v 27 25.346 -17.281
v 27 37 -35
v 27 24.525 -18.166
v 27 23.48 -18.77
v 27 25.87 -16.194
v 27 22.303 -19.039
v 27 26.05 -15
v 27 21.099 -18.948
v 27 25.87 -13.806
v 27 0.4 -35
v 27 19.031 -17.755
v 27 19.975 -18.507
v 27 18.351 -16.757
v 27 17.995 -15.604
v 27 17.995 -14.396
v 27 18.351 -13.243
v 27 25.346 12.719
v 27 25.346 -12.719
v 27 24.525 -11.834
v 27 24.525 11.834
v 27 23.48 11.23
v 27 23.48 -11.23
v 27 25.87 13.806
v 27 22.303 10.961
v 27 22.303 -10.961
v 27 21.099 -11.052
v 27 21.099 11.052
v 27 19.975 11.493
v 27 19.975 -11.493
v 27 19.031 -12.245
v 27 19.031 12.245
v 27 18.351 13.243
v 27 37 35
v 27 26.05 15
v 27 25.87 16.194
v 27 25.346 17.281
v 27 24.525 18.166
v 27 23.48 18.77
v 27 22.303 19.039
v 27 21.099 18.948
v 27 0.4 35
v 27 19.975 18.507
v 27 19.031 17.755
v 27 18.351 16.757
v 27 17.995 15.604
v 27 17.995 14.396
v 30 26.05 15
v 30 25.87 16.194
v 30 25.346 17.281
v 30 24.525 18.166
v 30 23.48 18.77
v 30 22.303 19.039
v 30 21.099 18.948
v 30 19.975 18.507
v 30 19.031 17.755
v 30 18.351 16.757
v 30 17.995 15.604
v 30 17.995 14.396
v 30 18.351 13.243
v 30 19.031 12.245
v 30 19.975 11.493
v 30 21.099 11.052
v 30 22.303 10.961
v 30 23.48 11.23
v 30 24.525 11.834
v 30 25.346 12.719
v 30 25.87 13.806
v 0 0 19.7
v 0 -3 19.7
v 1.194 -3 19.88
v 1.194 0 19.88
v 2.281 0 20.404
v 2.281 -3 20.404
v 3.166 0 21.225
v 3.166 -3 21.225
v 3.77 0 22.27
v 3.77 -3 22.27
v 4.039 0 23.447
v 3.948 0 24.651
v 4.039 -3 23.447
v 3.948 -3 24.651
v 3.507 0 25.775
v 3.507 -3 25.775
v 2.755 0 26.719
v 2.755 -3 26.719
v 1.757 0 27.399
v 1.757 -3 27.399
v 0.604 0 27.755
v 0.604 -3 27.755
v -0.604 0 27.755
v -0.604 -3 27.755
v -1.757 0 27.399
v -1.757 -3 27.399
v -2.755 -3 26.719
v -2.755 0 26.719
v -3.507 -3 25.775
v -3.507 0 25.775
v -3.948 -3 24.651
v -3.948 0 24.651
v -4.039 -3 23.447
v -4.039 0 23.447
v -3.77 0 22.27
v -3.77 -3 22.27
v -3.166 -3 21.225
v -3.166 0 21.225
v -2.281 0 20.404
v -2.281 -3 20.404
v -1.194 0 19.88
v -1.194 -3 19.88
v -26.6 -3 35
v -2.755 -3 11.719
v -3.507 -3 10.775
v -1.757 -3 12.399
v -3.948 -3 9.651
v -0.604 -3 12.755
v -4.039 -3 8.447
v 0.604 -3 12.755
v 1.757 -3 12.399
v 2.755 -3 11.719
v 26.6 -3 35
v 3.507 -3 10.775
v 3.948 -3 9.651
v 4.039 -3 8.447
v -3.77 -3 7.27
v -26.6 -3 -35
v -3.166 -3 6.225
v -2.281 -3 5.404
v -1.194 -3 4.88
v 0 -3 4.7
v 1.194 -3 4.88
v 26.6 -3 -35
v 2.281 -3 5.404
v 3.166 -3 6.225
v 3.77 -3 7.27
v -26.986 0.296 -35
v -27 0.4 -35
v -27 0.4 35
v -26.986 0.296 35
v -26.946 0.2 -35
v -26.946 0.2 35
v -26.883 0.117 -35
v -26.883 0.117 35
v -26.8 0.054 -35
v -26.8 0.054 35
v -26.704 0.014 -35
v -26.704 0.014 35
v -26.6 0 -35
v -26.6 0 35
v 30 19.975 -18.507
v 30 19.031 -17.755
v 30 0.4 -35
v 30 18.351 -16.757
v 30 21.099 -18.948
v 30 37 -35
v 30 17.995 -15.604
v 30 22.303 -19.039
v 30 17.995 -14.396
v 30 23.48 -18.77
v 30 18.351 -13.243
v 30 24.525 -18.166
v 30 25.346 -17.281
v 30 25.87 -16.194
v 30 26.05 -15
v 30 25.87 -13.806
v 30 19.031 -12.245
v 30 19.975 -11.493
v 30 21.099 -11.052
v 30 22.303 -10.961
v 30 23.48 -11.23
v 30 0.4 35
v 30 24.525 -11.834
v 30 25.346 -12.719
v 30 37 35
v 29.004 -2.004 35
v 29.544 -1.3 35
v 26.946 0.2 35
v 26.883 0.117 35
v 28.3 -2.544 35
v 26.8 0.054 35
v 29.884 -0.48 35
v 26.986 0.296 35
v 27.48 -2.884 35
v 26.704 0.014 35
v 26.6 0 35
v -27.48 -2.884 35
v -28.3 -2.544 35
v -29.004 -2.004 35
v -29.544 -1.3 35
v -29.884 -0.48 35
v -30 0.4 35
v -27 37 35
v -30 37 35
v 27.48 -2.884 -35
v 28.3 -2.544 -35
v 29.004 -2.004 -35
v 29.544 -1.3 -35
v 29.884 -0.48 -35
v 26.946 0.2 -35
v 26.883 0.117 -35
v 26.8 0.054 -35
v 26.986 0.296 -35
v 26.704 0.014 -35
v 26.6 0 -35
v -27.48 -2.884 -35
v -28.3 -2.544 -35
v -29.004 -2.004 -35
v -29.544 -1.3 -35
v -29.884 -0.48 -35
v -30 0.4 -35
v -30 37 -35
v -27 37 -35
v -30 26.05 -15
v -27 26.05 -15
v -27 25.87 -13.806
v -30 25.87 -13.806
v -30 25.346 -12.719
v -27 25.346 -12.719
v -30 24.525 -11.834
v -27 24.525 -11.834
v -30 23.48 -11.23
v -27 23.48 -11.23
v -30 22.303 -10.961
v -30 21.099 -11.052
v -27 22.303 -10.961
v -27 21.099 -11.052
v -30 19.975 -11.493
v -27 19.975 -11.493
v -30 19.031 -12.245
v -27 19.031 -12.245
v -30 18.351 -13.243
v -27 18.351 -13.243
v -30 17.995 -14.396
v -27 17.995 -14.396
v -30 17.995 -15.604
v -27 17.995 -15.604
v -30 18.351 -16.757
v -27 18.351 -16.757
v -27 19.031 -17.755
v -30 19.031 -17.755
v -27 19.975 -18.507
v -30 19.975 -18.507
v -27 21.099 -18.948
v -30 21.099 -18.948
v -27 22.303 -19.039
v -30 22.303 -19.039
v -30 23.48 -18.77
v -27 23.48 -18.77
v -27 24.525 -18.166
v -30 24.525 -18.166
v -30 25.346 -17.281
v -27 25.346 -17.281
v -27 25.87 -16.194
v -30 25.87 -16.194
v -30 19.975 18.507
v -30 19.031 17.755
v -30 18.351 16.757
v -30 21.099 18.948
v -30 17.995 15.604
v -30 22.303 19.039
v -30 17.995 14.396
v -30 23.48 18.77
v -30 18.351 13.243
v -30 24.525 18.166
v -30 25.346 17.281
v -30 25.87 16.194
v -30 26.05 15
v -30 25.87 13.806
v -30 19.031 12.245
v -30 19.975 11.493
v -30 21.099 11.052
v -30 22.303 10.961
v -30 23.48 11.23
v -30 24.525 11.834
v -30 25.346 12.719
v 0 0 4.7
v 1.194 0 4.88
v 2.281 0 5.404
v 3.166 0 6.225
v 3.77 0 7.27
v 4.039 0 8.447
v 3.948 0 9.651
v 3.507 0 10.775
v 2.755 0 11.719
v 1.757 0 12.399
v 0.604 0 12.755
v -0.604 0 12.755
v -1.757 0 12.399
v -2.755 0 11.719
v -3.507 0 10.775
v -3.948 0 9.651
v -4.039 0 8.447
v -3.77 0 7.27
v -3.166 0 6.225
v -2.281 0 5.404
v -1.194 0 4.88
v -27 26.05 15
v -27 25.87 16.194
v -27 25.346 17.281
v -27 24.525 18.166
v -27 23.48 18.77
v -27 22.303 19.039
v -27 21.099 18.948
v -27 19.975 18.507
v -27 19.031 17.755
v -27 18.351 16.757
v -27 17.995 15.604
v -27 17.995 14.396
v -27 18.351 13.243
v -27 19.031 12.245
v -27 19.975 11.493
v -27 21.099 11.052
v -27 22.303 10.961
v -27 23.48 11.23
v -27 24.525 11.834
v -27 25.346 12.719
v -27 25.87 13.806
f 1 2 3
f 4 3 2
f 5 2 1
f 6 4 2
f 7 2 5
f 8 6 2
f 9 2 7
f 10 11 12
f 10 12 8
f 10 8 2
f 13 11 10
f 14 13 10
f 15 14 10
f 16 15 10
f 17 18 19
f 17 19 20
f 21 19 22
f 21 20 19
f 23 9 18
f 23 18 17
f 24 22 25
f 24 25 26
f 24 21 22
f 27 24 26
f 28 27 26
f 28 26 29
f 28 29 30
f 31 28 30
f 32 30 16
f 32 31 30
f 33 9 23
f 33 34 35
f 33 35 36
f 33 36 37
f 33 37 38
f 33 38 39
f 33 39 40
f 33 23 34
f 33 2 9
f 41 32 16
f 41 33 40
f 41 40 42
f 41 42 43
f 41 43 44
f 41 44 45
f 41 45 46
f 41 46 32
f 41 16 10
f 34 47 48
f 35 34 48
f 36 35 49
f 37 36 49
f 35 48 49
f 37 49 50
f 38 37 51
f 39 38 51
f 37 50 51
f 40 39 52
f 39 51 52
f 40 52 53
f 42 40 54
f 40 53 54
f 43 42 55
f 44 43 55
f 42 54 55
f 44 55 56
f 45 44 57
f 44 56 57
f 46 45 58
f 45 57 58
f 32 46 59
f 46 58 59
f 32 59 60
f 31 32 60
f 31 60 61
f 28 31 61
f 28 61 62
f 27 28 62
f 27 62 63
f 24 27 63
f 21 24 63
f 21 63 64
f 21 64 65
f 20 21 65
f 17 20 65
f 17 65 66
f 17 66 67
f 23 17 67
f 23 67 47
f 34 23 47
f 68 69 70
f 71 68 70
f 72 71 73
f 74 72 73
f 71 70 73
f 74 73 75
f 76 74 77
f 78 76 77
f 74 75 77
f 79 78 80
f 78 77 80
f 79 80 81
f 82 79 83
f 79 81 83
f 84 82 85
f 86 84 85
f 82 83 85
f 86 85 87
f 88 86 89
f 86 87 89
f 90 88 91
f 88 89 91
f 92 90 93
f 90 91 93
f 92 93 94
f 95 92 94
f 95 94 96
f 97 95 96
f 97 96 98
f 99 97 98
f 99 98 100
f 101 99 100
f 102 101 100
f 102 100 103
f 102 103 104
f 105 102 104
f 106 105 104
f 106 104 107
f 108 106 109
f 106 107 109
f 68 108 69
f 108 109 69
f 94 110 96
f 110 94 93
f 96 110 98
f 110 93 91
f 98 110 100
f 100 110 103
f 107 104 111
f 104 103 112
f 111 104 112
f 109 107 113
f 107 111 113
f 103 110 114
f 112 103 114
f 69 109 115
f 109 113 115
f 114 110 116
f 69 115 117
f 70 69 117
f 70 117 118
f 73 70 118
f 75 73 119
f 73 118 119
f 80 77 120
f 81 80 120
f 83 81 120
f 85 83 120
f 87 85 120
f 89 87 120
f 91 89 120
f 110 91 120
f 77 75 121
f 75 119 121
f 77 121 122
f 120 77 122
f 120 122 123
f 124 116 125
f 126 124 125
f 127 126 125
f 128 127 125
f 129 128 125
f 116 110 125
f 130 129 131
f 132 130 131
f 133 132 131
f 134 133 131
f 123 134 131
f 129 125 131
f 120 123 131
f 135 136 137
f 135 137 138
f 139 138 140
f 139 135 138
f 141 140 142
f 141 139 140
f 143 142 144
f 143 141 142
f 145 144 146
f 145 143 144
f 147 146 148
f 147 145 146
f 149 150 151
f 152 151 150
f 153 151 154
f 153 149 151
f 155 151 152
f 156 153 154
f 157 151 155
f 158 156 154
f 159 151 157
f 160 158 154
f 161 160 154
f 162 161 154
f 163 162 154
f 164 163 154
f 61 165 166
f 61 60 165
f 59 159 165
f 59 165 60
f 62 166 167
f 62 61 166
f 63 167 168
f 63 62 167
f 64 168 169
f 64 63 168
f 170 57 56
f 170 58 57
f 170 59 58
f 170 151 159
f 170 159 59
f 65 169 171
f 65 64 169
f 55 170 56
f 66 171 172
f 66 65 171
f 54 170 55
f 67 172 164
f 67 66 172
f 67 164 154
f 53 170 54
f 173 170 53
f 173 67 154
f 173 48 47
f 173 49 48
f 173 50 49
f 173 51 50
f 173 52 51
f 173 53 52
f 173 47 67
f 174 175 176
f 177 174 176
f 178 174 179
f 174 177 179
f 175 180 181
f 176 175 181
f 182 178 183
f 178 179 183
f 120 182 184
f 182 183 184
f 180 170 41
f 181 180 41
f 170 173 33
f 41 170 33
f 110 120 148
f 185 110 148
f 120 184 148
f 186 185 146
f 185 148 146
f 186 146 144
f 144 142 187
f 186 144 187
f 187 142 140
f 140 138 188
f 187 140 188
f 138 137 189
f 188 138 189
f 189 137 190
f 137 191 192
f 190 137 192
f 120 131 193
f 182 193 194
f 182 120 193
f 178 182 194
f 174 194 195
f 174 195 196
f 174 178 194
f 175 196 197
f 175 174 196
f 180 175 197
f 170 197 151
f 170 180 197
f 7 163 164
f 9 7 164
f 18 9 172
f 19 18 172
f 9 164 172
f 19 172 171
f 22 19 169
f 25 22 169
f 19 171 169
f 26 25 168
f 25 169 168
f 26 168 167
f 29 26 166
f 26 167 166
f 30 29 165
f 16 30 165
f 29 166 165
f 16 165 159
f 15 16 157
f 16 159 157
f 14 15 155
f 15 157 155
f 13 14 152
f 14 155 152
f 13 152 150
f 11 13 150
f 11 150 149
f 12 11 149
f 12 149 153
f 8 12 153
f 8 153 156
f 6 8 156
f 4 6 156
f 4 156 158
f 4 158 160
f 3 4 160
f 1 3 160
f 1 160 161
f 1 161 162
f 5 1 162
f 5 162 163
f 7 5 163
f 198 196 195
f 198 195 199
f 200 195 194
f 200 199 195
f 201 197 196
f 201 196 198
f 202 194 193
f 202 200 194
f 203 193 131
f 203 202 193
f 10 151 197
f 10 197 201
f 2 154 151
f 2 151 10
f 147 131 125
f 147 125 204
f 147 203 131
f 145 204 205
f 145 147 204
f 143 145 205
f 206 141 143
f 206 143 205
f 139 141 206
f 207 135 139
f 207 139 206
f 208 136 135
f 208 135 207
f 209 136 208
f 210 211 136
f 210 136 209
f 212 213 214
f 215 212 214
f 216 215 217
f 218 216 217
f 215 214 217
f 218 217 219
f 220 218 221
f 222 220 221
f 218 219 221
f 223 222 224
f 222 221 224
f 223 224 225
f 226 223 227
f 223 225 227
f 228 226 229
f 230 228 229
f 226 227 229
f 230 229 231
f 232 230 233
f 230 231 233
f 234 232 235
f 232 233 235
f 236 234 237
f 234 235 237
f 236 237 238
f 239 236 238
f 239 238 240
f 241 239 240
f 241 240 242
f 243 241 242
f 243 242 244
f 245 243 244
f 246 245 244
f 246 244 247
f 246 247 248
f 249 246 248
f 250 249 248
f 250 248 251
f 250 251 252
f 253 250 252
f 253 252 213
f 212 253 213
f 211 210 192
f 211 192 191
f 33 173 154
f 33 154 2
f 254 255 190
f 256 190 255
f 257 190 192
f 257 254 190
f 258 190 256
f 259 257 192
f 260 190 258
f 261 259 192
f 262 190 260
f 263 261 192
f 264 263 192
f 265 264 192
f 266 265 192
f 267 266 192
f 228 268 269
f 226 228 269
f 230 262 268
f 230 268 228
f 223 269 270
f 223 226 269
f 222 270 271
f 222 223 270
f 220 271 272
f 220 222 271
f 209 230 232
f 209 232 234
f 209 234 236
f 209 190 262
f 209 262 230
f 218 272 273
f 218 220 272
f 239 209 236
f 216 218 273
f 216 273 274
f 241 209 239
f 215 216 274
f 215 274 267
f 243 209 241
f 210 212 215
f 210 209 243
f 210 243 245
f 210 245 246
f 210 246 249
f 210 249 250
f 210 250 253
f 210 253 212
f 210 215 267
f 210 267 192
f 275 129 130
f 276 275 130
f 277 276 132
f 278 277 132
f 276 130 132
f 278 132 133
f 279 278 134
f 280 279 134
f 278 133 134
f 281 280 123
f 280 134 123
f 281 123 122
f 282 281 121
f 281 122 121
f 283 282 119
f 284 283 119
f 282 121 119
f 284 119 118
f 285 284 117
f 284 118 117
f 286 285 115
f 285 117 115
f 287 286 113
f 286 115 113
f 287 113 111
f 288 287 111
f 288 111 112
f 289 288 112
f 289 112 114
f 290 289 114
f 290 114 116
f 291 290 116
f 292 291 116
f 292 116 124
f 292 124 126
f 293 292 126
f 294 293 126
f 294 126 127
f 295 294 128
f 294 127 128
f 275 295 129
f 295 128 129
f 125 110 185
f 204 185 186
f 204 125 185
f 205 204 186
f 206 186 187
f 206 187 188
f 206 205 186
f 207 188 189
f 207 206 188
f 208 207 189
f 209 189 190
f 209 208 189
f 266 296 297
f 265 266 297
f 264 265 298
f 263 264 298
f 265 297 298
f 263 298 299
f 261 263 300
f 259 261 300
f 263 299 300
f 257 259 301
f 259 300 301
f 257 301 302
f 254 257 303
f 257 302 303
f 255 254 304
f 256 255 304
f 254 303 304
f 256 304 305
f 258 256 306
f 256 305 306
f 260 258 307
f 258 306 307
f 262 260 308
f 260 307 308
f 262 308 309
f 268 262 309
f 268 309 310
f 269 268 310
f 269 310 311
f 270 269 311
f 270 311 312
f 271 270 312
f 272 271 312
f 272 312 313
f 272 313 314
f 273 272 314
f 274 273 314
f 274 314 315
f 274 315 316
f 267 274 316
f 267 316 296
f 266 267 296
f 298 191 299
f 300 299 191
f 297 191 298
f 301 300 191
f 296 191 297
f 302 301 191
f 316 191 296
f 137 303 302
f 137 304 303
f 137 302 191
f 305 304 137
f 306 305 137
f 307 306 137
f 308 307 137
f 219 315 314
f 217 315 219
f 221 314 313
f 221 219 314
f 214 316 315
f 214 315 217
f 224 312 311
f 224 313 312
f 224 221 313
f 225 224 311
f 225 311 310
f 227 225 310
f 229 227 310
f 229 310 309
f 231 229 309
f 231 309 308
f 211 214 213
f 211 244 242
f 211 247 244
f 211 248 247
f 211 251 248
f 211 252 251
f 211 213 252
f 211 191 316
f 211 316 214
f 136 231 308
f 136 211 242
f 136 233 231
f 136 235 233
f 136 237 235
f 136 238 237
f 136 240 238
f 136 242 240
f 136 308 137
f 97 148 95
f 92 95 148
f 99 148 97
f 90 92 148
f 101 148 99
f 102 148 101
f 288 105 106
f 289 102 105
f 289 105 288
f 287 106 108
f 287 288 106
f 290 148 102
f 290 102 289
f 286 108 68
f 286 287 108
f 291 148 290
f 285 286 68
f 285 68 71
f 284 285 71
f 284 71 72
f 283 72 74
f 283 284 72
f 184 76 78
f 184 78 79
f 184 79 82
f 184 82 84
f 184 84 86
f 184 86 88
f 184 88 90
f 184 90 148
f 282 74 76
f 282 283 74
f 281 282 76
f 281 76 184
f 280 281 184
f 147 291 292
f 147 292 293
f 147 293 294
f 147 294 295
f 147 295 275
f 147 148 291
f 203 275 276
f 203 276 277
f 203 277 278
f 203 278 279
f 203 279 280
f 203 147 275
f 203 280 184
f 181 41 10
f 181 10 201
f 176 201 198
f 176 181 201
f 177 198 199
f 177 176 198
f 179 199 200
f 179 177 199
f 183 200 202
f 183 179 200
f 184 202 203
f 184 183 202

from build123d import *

# Parameters (mm, degrees)
SKETCH1_W                      = 60
SKETCH1_H                      = 70
BASE_FLANGE1_DEPTH             = 3
EDGE_FLANGE1_STRIP_W           = 12.8
EDGE_FLANGE1_STRIP_H           = 3
EDGE_FLANGE1_STRIP_CUT_DEPTH   = 70
EDGE_FLANGE1_STRIP_2_W         = 12.8
EDGE_FLANGE1_STRIP_2_H         = 3
EDGE_FLANGE1_STRIP_CUT_2_DEPTH = 70
EDGE_FLANGE1_DEPTH             = 70
EDGE_FLANGE1_BEND_DEPTH        = 70
CUT_EXTRUDE1_REACH             = 80.702
SKETCH14_R                     = 4.05
SKETCH15_R                     = 4.05
CUT_EXTRUDE2_DEPTH             = 3


# Sheet-metal steps are written as plain solids
with BuildPart() as part:
    # Sketch1 → Base-Flange1 (new body)
    with BuildSketch(Plane(origin=(0, 0, 0), x_dir=(1, 0, 0), z_dir=(0, 1, 0))):
        Rectangle(SKETCH1_W, SKETCH1_H)
    extrude(amount=-BASE_FLANGE1_DEPTH)

    # Edge-Flange1 strip (across the edge) → Edge-Flange1 strip cut (cut)
    with BuildSketch(Plane(origin=(30, 0, 35), x_dir=(-1, 0, 0), z_dir=(0, 0, -1))):
        with Locations((-3, -1.5)):
            Rectangle(EDGE_FLANGE1_STRIP_W, EDGE_FLANGE1_STRIP_H)
    extrude(amount=EDGE_FLANGE1_STRIP_CUT_DEPTH, mode=Mode.SUBTRACT)

    # Edge-Flange1 strip 2 (across the edge) → Edge-Flange1 strip cut 2 (cut)
    with BuildSketch(Plane(origin=(-30, 0, -35), x_dir=(1, 0, 0), z_dir=(0, 0, 1))):
        with Locations((-3, -1.5)):
            Rectangle(EDGE_FLANGE1_STRIP_2_W, EDGE_FLANGE1_STRIP_2_H)
    extrude(amount=EDGE_FLANGE1_STRIP_CUT_2_DEPTH, mode=Mode.SUBTRACT)

    # Edge-Flange1 section (across the edge) → Edge-Flange1 (add)
    with BuildSketch(Plane(origin=(30, 0, 35), x_dir=(-1, 0, 0), z_dir=(0, 0, -1))):
        with BuildLine():
            Line((0, 0.4), (0, 37))
            Line((0, 37), (3, 37))
            Line((3, 37), (3, 0.4))
            ThreePointArc((3, 0.4), (3.117157288, 0.117157288), (3.4, 0))
            Line((3.4, 0), (3.4, -3))
            ThreePointArc((3.4, -3), (0.995836944, -2.004163056), (0, 0.4))
        make_face()
    extrude(amount=EDGE_FLANGE1_DEPTH)

    # Edge-Flange1 section 2 (across the edge) → Edge-Flange1 bend (add)
    with BuildSketch(Plane(origin=(-30, 0, -35), x_dir=(1, 0, 0), z_dir=(0, 0, 1))):
        with BuildLine():
            Line((0, 0.4), (0, 37))
            Line((0, 37), (3, 37))
            Line((3, 37), (3, 0.4))
            ThreePointArc((3, 0.4), (3.117157288, 0.117157288), (3.4, 0))
            Line((3.4, 0), (3.4, -3))
            ThreePointArc((3.4, -3), (0.995836944, -2.004163056), (0, 0.4))
        make_face()
    extrude(amount=EDGE_FLANGE1_BEND_DEPTH)

    # Cut-Extrude1: up to this face of the body (flat: up to its plane)
    cut_extrude1_end = Plane(part.part.faces().sort_by_distance((-30, 18.7, 0))[0])
    # Sketch14 → Cut-Extrude1 (cut, up to the picked face)
    with BuildSketch(Plane(origin=(30, 0, 0), x_dir=(0, 0, -1), z_dir=(1, 0, 0)), mode=Mode.PRIVATE) as cut_extrude1_sk1:
        with Locations(Location((-15, 22, 0), (0, 0, 90))):
            Circle(SKETCH14_R)
    cut_extrude1_tool1 = split(extrude(cut_extrude1_sk1.sketch, amount=-CUT_EXTRUDE1_REACH, mode=Mode.PRIVATE), bisect_by=cut_extrude1_end, keep=Keep.BOTH, mode=Mode.PRIVATE)
    # Sketch14 → Cut-Extrude1 (cut, up to the picked face)
    with BuildSketch(Plane(origin=(30, 0, 0), x_dir=(0, 0, -1), z_dir=(1, 0, 0)), mode=Mode.PRIVATE) as cut_extrude1_sk2:
        with Locations(Location((15, 22, 0), (0, 0, 90))):
            Circle(SKETCH14_R)
    cut_extrude1_tool2 = split(extrude(cut_extrude1_sk2.sketch, amount=-CUT_EXTRUDE1_REACH, mode=Mode.PRIVATE), bisect_by=cut_extrude1_end, keep=Keep.BOTH, mode=Mode.PRIVATE)
    add(cut_extrude1_tool1.solids().sort_by(Axis((30, 22, 15), (-1, 0, 0)))[0], mode=Mode.SUBTRACT)
    add(cut_extrude1_tool2.solids().sort_by(Axis((30, 22, -15), (-1, 0, 0)))[0], mode=Mode.SUBTRACT)

    # Sketch15 → Cut-Extrude2 (cut)
    with BuildSketch(Plane.XZ.offset(3)):
        with Locations(Location((0, 8.75, 0), (0, 0, 270))):
            Circle(SKETCH15_R)
        with Locations(Location((0, 23.75, 0), (0, 0, 270))):
            Circle(SKETCH15_R)
    extrude(amount=-CUT_EXTRUDE2_DEPTH, mode=Mode.SUBTRACT)


solid = part.part
